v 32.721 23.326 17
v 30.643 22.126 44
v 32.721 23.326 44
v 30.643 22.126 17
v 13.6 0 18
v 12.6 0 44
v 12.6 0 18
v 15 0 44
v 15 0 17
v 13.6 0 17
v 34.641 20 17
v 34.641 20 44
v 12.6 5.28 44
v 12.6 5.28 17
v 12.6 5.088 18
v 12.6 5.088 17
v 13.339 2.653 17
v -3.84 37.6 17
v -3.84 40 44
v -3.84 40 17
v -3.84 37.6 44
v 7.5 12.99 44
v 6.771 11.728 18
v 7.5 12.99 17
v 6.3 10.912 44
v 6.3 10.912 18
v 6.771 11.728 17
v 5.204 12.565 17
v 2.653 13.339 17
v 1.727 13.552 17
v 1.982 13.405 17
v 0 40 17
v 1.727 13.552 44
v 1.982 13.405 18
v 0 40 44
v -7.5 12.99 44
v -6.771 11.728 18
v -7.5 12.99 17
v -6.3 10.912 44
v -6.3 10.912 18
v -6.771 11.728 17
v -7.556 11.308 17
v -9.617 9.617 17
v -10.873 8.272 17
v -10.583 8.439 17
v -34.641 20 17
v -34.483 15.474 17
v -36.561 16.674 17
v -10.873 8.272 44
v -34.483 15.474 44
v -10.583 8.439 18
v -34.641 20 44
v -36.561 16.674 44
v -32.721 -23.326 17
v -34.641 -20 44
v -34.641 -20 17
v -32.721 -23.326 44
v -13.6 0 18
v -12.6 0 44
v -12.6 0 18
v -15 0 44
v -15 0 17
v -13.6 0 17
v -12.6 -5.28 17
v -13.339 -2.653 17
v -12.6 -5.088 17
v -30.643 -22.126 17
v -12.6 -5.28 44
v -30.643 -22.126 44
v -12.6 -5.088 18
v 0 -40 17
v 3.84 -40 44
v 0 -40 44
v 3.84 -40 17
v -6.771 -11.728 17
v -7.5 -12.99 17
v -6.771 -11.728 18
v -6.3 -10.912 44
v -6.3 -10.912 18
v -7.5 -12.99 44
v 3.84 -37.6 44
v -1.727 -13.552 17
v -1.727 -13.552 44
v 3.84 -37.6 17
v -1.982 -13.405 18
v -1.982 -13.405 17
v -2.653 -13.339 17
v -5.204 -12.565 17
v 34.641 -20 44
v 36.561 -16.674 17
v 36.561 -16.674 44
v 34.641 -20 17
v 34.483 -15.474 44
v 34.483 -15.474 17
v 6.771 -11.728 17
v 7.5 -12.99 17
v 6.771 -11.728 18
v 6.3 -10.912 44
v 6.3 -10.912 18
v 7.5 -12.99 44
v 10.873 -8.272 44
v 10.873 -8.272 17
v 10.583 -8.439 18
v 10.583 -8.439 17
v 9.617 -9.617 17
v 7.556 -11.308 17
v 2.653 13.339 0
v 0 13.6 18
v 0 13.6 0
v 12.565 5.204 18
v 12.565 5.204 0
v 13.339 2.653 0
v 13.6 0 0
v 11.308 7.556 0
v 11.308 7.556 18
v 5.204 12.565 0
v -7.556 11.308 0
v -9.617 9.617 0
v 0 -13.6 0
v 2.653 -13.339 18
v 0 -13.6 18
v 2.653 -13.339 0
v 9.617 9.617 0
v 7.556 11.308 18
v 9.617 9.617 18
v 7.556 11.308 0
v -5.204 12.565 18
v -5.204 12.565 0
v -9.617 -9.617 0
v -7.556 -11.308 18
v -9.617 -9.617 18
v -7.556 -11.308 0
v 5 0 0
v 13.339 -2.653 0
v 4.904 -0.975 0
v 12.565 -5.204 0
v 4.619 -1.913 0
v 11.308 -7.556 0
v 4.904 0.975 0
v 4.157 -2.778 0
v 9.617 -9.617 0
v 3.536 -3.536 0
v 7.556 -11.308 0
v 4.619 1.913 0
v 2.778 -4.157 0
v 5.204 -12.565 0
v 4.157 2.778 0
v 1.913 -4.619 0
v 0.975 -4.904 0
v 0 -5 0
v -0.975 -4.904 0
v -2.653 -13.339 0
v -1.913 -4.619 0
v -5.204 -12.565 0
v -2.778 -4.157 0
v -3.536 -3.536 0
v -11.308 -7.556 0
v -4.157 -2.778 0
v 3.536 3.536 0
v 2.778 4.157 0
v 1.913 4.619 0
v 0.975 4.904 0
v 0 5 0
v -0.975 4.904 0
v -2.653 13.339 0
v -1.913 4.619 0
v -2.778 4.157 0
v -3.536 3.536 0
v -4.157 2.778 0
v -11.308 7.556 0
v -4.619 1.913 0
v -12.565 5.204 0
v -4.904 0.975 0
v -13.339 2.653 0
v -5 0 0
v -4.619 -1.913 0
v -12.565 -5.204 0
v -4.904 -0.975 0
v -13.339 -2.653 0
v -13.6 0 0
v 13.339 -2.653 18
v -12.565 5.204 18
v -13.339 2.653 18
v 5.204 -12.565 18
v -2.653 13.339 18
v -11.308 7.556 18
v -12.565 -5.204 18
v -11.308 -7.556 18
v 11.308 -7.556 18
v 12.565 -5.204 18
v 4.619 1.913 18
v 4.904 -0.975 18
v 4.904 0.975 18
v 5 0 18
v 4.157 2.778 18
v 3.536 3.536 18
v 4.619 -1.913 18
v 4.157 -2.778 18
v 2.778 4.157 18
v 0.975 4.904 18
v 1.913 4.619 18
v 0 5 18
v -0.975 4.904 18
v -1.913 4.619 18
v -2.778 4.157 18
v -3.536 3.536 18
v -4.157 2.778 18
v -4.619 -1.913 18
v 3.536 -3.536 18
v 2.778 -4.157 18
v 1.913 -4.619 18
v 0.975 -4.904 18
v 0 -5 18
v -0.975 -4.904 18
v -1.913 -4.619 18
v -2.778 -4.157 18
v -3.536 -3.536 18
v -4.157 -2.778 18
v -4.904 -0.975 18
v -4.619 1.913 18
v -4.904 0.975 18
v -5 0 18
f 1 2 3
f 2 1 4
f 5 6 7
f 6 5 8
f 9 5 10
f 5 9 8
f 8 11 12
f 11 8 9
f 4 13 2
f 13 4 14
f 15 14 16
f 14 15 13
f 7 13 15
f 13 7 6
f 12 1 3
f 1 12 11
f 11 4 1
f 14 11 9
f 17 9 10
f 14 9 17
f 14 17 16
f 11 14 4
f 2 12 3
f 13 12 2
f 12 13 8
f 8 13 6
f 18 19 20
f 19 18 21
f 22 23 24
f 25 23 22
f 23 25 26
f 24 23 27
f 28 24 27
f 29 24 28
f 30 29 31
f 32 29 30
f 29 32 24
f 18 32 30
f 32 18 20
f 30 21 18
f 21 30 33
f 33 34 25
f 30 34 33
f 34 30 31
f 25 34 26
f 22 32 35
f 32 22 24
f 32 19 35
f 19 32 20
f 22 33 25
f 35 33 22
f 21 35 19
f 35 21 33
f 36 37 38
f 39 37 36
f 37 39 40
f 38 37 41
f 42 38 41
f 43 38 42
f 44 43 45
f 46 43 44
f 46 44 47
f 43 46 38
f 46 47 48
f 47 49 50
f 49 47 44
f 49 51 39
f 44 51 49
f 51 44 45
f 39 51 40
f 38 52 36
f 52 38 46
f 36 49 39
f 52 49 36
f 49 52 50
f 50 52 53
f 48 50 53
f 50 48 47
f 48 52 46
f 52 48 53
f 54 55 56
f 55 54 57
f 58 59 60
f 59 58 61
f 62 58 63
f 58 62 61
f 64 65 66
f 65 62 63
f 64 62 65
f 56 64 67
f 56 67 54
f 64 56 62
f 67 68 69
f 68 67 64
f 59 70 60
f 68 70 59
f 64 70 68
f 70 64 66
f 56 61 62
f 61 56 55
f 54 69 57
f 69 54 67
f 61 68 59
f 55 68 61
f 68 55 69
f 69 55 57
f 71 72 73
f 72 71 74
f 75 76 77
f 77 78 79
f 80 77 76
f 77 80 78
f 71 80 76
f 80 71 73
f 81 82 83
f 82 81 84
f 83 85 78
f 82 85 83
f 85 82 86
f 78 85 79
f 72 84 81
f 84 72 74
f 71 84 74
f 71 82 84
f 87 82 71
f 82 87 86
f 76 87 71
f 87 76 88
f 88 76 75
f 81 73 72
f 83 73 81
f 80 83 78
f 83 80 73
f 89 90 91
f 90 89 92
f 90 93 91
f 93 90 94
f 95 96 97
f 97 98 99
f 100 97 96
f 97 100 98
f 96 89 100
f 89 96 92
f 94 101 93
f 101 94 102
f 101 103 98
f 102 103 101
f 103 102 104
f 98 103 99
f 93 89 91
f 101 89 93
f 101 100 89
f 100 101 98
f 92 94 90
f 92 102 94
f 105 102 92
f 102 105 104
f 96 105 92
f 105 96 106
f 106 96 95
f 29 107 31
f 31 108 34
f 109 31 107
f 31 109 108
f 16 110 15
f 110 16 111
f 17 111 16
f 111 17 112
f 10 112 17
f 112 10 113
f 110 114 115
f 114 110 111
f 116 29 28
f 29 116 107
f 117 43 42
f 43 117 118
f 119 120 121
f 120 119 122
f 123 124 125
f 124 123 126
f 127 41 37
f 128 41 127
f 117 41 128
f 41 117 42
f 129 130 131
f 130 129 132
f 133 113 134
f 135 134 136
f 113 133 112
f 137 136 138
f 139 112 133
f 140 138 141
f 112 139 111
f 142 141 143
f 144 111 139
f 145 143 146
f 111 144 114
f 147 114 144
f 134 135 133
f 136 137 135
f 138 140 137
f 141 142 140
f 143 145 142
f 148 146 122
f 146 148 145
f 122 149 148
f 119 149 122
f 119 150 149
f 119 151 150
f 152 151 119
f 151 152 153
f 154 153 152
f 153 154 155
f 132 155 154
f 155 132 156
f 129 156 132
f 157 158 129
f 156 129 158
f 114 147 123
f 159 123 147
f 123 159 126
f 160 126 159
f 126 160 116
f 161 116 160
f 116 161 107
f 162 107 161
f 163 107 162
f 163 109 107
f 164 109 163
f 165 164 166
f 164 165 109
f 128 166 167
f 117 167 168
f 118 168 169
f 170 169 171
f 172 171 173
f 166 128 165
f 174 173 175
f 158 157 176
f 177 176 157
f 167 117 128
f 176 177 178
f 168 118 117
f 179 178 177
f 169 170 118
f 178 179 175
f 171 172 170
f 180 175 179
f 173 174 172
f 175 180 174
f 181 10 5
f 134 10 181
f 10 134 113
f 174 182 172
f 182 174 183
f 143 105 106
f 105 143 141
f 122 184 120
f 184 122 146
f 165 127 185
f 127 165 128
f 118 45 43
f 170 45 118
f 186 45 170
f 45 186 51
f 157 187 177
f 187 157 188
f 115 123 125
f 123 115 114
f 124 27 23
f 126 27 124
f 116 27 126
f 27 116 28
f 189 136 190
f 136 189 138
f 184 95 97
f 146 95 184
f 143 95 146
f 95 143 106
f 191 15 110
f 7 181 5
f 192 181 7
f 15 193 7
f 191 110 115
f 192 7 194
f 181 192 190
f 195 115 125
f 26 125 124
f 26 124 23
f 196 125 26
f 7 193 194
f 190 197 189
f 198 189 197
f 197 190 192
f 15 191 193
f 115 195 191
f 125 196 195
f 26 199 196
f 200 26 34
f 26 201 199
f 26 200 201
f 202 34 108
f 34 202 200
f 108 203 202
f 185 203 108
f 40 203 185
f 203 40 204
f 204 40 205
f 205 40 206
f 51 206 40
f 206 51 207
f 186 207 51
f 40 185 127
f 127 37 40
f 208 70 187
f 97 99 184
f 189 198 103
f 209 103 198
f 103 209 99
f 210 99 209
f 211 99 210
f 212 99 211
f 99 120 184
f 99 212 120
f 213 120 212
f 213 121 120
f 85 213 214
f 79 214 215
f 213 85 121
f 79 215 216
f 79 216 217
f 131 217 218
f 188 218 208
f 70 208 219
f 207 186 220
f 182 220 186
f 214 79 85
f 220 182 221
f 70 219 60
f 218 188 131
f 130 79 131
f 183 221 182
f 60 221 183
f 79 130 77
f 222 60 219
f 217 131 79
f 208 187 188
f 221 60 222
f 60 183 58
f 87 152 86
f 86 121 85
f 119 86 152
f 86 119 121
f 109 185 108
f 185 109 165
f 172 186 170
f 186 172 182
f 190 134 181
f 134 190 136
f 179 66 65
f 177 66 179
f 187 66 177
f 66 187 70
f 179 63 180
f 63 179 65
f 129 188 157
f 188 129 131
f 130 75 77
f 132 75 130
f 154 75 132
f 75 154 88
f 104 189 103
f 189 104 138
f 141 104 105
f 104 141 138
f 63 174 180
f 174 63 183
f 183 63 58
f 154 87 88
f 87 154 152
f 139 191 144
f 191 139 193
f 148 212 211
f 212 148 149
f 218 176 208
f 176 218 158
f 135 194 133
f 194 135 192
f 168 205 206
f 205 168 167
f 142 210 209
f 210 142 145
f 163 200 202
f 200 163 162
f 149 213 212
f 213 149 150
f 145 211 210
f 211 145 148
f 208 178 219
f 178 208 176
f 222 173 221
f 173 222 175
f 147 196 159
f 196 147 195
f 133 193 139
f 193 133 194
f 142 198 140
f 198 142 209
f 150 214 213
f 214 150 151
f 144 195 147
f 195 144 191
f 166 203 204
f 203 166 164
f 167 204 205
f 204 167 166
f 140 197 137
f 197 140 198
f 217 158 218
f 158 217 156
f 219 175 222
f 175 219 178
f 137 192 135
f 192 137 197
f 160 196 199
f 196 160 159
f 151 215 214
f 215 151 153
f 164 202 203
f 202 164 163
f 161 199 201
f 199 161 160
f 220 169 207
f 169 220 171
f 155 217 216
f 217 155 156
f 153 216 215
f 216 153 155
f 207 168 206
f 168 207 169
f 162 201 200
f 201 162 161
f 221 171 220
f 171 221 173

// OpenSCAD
$fn = 32;

// ----------------------------------------------------------------------
// Impeller: 80 mm, 6 blades, 44 mm tall
// ----------------------------------------------------------------------

// --- parameters (mm) ---
hub_d = 27.2;             // hub diameter
hub_h = 18;               // hub height
imp_d = 80;               // outer diameter over the blades
blades = 6;               // number of blades
blade_t = 2.4;            // blade thickness
blade_h = 26;             // blade height
blade_in_r = 12.6;        // blade root radius
blade_out_r = 37.6;       // blade tip radius
sweep = 30;               // blade sweep, degrees
bore_d = 10;              // shaft bore

module hub() {
  cylinder(h = hub_h, d = hub_d);
}

module blade() {
  /* blade swept between two boxes: hull of the root and the tip section */
  hull() {
    translate([blade_in_r, 0, hub_h - 1])
      cube([blade_t, blade_t * 2.2, blade_h + 1], center = false);
    rotate([0, 0, sweep])
      translate([blade_out_r, 0, hub_h - 1])
        cube([blade_t, blade_t * 1.6, blade_h + 1], center = false);
  }
}

module blades() {
  for (i = [0 : blades - 1])
    rotate([0, 0, i * 360 / blades]) blade();
}

difference() {
  union() {
    hub();
    blades();
  }
  translate([0, 0, -1]) cylinder(h = hub_h + blade_h + 0 + 3, d = bore_d);
}
